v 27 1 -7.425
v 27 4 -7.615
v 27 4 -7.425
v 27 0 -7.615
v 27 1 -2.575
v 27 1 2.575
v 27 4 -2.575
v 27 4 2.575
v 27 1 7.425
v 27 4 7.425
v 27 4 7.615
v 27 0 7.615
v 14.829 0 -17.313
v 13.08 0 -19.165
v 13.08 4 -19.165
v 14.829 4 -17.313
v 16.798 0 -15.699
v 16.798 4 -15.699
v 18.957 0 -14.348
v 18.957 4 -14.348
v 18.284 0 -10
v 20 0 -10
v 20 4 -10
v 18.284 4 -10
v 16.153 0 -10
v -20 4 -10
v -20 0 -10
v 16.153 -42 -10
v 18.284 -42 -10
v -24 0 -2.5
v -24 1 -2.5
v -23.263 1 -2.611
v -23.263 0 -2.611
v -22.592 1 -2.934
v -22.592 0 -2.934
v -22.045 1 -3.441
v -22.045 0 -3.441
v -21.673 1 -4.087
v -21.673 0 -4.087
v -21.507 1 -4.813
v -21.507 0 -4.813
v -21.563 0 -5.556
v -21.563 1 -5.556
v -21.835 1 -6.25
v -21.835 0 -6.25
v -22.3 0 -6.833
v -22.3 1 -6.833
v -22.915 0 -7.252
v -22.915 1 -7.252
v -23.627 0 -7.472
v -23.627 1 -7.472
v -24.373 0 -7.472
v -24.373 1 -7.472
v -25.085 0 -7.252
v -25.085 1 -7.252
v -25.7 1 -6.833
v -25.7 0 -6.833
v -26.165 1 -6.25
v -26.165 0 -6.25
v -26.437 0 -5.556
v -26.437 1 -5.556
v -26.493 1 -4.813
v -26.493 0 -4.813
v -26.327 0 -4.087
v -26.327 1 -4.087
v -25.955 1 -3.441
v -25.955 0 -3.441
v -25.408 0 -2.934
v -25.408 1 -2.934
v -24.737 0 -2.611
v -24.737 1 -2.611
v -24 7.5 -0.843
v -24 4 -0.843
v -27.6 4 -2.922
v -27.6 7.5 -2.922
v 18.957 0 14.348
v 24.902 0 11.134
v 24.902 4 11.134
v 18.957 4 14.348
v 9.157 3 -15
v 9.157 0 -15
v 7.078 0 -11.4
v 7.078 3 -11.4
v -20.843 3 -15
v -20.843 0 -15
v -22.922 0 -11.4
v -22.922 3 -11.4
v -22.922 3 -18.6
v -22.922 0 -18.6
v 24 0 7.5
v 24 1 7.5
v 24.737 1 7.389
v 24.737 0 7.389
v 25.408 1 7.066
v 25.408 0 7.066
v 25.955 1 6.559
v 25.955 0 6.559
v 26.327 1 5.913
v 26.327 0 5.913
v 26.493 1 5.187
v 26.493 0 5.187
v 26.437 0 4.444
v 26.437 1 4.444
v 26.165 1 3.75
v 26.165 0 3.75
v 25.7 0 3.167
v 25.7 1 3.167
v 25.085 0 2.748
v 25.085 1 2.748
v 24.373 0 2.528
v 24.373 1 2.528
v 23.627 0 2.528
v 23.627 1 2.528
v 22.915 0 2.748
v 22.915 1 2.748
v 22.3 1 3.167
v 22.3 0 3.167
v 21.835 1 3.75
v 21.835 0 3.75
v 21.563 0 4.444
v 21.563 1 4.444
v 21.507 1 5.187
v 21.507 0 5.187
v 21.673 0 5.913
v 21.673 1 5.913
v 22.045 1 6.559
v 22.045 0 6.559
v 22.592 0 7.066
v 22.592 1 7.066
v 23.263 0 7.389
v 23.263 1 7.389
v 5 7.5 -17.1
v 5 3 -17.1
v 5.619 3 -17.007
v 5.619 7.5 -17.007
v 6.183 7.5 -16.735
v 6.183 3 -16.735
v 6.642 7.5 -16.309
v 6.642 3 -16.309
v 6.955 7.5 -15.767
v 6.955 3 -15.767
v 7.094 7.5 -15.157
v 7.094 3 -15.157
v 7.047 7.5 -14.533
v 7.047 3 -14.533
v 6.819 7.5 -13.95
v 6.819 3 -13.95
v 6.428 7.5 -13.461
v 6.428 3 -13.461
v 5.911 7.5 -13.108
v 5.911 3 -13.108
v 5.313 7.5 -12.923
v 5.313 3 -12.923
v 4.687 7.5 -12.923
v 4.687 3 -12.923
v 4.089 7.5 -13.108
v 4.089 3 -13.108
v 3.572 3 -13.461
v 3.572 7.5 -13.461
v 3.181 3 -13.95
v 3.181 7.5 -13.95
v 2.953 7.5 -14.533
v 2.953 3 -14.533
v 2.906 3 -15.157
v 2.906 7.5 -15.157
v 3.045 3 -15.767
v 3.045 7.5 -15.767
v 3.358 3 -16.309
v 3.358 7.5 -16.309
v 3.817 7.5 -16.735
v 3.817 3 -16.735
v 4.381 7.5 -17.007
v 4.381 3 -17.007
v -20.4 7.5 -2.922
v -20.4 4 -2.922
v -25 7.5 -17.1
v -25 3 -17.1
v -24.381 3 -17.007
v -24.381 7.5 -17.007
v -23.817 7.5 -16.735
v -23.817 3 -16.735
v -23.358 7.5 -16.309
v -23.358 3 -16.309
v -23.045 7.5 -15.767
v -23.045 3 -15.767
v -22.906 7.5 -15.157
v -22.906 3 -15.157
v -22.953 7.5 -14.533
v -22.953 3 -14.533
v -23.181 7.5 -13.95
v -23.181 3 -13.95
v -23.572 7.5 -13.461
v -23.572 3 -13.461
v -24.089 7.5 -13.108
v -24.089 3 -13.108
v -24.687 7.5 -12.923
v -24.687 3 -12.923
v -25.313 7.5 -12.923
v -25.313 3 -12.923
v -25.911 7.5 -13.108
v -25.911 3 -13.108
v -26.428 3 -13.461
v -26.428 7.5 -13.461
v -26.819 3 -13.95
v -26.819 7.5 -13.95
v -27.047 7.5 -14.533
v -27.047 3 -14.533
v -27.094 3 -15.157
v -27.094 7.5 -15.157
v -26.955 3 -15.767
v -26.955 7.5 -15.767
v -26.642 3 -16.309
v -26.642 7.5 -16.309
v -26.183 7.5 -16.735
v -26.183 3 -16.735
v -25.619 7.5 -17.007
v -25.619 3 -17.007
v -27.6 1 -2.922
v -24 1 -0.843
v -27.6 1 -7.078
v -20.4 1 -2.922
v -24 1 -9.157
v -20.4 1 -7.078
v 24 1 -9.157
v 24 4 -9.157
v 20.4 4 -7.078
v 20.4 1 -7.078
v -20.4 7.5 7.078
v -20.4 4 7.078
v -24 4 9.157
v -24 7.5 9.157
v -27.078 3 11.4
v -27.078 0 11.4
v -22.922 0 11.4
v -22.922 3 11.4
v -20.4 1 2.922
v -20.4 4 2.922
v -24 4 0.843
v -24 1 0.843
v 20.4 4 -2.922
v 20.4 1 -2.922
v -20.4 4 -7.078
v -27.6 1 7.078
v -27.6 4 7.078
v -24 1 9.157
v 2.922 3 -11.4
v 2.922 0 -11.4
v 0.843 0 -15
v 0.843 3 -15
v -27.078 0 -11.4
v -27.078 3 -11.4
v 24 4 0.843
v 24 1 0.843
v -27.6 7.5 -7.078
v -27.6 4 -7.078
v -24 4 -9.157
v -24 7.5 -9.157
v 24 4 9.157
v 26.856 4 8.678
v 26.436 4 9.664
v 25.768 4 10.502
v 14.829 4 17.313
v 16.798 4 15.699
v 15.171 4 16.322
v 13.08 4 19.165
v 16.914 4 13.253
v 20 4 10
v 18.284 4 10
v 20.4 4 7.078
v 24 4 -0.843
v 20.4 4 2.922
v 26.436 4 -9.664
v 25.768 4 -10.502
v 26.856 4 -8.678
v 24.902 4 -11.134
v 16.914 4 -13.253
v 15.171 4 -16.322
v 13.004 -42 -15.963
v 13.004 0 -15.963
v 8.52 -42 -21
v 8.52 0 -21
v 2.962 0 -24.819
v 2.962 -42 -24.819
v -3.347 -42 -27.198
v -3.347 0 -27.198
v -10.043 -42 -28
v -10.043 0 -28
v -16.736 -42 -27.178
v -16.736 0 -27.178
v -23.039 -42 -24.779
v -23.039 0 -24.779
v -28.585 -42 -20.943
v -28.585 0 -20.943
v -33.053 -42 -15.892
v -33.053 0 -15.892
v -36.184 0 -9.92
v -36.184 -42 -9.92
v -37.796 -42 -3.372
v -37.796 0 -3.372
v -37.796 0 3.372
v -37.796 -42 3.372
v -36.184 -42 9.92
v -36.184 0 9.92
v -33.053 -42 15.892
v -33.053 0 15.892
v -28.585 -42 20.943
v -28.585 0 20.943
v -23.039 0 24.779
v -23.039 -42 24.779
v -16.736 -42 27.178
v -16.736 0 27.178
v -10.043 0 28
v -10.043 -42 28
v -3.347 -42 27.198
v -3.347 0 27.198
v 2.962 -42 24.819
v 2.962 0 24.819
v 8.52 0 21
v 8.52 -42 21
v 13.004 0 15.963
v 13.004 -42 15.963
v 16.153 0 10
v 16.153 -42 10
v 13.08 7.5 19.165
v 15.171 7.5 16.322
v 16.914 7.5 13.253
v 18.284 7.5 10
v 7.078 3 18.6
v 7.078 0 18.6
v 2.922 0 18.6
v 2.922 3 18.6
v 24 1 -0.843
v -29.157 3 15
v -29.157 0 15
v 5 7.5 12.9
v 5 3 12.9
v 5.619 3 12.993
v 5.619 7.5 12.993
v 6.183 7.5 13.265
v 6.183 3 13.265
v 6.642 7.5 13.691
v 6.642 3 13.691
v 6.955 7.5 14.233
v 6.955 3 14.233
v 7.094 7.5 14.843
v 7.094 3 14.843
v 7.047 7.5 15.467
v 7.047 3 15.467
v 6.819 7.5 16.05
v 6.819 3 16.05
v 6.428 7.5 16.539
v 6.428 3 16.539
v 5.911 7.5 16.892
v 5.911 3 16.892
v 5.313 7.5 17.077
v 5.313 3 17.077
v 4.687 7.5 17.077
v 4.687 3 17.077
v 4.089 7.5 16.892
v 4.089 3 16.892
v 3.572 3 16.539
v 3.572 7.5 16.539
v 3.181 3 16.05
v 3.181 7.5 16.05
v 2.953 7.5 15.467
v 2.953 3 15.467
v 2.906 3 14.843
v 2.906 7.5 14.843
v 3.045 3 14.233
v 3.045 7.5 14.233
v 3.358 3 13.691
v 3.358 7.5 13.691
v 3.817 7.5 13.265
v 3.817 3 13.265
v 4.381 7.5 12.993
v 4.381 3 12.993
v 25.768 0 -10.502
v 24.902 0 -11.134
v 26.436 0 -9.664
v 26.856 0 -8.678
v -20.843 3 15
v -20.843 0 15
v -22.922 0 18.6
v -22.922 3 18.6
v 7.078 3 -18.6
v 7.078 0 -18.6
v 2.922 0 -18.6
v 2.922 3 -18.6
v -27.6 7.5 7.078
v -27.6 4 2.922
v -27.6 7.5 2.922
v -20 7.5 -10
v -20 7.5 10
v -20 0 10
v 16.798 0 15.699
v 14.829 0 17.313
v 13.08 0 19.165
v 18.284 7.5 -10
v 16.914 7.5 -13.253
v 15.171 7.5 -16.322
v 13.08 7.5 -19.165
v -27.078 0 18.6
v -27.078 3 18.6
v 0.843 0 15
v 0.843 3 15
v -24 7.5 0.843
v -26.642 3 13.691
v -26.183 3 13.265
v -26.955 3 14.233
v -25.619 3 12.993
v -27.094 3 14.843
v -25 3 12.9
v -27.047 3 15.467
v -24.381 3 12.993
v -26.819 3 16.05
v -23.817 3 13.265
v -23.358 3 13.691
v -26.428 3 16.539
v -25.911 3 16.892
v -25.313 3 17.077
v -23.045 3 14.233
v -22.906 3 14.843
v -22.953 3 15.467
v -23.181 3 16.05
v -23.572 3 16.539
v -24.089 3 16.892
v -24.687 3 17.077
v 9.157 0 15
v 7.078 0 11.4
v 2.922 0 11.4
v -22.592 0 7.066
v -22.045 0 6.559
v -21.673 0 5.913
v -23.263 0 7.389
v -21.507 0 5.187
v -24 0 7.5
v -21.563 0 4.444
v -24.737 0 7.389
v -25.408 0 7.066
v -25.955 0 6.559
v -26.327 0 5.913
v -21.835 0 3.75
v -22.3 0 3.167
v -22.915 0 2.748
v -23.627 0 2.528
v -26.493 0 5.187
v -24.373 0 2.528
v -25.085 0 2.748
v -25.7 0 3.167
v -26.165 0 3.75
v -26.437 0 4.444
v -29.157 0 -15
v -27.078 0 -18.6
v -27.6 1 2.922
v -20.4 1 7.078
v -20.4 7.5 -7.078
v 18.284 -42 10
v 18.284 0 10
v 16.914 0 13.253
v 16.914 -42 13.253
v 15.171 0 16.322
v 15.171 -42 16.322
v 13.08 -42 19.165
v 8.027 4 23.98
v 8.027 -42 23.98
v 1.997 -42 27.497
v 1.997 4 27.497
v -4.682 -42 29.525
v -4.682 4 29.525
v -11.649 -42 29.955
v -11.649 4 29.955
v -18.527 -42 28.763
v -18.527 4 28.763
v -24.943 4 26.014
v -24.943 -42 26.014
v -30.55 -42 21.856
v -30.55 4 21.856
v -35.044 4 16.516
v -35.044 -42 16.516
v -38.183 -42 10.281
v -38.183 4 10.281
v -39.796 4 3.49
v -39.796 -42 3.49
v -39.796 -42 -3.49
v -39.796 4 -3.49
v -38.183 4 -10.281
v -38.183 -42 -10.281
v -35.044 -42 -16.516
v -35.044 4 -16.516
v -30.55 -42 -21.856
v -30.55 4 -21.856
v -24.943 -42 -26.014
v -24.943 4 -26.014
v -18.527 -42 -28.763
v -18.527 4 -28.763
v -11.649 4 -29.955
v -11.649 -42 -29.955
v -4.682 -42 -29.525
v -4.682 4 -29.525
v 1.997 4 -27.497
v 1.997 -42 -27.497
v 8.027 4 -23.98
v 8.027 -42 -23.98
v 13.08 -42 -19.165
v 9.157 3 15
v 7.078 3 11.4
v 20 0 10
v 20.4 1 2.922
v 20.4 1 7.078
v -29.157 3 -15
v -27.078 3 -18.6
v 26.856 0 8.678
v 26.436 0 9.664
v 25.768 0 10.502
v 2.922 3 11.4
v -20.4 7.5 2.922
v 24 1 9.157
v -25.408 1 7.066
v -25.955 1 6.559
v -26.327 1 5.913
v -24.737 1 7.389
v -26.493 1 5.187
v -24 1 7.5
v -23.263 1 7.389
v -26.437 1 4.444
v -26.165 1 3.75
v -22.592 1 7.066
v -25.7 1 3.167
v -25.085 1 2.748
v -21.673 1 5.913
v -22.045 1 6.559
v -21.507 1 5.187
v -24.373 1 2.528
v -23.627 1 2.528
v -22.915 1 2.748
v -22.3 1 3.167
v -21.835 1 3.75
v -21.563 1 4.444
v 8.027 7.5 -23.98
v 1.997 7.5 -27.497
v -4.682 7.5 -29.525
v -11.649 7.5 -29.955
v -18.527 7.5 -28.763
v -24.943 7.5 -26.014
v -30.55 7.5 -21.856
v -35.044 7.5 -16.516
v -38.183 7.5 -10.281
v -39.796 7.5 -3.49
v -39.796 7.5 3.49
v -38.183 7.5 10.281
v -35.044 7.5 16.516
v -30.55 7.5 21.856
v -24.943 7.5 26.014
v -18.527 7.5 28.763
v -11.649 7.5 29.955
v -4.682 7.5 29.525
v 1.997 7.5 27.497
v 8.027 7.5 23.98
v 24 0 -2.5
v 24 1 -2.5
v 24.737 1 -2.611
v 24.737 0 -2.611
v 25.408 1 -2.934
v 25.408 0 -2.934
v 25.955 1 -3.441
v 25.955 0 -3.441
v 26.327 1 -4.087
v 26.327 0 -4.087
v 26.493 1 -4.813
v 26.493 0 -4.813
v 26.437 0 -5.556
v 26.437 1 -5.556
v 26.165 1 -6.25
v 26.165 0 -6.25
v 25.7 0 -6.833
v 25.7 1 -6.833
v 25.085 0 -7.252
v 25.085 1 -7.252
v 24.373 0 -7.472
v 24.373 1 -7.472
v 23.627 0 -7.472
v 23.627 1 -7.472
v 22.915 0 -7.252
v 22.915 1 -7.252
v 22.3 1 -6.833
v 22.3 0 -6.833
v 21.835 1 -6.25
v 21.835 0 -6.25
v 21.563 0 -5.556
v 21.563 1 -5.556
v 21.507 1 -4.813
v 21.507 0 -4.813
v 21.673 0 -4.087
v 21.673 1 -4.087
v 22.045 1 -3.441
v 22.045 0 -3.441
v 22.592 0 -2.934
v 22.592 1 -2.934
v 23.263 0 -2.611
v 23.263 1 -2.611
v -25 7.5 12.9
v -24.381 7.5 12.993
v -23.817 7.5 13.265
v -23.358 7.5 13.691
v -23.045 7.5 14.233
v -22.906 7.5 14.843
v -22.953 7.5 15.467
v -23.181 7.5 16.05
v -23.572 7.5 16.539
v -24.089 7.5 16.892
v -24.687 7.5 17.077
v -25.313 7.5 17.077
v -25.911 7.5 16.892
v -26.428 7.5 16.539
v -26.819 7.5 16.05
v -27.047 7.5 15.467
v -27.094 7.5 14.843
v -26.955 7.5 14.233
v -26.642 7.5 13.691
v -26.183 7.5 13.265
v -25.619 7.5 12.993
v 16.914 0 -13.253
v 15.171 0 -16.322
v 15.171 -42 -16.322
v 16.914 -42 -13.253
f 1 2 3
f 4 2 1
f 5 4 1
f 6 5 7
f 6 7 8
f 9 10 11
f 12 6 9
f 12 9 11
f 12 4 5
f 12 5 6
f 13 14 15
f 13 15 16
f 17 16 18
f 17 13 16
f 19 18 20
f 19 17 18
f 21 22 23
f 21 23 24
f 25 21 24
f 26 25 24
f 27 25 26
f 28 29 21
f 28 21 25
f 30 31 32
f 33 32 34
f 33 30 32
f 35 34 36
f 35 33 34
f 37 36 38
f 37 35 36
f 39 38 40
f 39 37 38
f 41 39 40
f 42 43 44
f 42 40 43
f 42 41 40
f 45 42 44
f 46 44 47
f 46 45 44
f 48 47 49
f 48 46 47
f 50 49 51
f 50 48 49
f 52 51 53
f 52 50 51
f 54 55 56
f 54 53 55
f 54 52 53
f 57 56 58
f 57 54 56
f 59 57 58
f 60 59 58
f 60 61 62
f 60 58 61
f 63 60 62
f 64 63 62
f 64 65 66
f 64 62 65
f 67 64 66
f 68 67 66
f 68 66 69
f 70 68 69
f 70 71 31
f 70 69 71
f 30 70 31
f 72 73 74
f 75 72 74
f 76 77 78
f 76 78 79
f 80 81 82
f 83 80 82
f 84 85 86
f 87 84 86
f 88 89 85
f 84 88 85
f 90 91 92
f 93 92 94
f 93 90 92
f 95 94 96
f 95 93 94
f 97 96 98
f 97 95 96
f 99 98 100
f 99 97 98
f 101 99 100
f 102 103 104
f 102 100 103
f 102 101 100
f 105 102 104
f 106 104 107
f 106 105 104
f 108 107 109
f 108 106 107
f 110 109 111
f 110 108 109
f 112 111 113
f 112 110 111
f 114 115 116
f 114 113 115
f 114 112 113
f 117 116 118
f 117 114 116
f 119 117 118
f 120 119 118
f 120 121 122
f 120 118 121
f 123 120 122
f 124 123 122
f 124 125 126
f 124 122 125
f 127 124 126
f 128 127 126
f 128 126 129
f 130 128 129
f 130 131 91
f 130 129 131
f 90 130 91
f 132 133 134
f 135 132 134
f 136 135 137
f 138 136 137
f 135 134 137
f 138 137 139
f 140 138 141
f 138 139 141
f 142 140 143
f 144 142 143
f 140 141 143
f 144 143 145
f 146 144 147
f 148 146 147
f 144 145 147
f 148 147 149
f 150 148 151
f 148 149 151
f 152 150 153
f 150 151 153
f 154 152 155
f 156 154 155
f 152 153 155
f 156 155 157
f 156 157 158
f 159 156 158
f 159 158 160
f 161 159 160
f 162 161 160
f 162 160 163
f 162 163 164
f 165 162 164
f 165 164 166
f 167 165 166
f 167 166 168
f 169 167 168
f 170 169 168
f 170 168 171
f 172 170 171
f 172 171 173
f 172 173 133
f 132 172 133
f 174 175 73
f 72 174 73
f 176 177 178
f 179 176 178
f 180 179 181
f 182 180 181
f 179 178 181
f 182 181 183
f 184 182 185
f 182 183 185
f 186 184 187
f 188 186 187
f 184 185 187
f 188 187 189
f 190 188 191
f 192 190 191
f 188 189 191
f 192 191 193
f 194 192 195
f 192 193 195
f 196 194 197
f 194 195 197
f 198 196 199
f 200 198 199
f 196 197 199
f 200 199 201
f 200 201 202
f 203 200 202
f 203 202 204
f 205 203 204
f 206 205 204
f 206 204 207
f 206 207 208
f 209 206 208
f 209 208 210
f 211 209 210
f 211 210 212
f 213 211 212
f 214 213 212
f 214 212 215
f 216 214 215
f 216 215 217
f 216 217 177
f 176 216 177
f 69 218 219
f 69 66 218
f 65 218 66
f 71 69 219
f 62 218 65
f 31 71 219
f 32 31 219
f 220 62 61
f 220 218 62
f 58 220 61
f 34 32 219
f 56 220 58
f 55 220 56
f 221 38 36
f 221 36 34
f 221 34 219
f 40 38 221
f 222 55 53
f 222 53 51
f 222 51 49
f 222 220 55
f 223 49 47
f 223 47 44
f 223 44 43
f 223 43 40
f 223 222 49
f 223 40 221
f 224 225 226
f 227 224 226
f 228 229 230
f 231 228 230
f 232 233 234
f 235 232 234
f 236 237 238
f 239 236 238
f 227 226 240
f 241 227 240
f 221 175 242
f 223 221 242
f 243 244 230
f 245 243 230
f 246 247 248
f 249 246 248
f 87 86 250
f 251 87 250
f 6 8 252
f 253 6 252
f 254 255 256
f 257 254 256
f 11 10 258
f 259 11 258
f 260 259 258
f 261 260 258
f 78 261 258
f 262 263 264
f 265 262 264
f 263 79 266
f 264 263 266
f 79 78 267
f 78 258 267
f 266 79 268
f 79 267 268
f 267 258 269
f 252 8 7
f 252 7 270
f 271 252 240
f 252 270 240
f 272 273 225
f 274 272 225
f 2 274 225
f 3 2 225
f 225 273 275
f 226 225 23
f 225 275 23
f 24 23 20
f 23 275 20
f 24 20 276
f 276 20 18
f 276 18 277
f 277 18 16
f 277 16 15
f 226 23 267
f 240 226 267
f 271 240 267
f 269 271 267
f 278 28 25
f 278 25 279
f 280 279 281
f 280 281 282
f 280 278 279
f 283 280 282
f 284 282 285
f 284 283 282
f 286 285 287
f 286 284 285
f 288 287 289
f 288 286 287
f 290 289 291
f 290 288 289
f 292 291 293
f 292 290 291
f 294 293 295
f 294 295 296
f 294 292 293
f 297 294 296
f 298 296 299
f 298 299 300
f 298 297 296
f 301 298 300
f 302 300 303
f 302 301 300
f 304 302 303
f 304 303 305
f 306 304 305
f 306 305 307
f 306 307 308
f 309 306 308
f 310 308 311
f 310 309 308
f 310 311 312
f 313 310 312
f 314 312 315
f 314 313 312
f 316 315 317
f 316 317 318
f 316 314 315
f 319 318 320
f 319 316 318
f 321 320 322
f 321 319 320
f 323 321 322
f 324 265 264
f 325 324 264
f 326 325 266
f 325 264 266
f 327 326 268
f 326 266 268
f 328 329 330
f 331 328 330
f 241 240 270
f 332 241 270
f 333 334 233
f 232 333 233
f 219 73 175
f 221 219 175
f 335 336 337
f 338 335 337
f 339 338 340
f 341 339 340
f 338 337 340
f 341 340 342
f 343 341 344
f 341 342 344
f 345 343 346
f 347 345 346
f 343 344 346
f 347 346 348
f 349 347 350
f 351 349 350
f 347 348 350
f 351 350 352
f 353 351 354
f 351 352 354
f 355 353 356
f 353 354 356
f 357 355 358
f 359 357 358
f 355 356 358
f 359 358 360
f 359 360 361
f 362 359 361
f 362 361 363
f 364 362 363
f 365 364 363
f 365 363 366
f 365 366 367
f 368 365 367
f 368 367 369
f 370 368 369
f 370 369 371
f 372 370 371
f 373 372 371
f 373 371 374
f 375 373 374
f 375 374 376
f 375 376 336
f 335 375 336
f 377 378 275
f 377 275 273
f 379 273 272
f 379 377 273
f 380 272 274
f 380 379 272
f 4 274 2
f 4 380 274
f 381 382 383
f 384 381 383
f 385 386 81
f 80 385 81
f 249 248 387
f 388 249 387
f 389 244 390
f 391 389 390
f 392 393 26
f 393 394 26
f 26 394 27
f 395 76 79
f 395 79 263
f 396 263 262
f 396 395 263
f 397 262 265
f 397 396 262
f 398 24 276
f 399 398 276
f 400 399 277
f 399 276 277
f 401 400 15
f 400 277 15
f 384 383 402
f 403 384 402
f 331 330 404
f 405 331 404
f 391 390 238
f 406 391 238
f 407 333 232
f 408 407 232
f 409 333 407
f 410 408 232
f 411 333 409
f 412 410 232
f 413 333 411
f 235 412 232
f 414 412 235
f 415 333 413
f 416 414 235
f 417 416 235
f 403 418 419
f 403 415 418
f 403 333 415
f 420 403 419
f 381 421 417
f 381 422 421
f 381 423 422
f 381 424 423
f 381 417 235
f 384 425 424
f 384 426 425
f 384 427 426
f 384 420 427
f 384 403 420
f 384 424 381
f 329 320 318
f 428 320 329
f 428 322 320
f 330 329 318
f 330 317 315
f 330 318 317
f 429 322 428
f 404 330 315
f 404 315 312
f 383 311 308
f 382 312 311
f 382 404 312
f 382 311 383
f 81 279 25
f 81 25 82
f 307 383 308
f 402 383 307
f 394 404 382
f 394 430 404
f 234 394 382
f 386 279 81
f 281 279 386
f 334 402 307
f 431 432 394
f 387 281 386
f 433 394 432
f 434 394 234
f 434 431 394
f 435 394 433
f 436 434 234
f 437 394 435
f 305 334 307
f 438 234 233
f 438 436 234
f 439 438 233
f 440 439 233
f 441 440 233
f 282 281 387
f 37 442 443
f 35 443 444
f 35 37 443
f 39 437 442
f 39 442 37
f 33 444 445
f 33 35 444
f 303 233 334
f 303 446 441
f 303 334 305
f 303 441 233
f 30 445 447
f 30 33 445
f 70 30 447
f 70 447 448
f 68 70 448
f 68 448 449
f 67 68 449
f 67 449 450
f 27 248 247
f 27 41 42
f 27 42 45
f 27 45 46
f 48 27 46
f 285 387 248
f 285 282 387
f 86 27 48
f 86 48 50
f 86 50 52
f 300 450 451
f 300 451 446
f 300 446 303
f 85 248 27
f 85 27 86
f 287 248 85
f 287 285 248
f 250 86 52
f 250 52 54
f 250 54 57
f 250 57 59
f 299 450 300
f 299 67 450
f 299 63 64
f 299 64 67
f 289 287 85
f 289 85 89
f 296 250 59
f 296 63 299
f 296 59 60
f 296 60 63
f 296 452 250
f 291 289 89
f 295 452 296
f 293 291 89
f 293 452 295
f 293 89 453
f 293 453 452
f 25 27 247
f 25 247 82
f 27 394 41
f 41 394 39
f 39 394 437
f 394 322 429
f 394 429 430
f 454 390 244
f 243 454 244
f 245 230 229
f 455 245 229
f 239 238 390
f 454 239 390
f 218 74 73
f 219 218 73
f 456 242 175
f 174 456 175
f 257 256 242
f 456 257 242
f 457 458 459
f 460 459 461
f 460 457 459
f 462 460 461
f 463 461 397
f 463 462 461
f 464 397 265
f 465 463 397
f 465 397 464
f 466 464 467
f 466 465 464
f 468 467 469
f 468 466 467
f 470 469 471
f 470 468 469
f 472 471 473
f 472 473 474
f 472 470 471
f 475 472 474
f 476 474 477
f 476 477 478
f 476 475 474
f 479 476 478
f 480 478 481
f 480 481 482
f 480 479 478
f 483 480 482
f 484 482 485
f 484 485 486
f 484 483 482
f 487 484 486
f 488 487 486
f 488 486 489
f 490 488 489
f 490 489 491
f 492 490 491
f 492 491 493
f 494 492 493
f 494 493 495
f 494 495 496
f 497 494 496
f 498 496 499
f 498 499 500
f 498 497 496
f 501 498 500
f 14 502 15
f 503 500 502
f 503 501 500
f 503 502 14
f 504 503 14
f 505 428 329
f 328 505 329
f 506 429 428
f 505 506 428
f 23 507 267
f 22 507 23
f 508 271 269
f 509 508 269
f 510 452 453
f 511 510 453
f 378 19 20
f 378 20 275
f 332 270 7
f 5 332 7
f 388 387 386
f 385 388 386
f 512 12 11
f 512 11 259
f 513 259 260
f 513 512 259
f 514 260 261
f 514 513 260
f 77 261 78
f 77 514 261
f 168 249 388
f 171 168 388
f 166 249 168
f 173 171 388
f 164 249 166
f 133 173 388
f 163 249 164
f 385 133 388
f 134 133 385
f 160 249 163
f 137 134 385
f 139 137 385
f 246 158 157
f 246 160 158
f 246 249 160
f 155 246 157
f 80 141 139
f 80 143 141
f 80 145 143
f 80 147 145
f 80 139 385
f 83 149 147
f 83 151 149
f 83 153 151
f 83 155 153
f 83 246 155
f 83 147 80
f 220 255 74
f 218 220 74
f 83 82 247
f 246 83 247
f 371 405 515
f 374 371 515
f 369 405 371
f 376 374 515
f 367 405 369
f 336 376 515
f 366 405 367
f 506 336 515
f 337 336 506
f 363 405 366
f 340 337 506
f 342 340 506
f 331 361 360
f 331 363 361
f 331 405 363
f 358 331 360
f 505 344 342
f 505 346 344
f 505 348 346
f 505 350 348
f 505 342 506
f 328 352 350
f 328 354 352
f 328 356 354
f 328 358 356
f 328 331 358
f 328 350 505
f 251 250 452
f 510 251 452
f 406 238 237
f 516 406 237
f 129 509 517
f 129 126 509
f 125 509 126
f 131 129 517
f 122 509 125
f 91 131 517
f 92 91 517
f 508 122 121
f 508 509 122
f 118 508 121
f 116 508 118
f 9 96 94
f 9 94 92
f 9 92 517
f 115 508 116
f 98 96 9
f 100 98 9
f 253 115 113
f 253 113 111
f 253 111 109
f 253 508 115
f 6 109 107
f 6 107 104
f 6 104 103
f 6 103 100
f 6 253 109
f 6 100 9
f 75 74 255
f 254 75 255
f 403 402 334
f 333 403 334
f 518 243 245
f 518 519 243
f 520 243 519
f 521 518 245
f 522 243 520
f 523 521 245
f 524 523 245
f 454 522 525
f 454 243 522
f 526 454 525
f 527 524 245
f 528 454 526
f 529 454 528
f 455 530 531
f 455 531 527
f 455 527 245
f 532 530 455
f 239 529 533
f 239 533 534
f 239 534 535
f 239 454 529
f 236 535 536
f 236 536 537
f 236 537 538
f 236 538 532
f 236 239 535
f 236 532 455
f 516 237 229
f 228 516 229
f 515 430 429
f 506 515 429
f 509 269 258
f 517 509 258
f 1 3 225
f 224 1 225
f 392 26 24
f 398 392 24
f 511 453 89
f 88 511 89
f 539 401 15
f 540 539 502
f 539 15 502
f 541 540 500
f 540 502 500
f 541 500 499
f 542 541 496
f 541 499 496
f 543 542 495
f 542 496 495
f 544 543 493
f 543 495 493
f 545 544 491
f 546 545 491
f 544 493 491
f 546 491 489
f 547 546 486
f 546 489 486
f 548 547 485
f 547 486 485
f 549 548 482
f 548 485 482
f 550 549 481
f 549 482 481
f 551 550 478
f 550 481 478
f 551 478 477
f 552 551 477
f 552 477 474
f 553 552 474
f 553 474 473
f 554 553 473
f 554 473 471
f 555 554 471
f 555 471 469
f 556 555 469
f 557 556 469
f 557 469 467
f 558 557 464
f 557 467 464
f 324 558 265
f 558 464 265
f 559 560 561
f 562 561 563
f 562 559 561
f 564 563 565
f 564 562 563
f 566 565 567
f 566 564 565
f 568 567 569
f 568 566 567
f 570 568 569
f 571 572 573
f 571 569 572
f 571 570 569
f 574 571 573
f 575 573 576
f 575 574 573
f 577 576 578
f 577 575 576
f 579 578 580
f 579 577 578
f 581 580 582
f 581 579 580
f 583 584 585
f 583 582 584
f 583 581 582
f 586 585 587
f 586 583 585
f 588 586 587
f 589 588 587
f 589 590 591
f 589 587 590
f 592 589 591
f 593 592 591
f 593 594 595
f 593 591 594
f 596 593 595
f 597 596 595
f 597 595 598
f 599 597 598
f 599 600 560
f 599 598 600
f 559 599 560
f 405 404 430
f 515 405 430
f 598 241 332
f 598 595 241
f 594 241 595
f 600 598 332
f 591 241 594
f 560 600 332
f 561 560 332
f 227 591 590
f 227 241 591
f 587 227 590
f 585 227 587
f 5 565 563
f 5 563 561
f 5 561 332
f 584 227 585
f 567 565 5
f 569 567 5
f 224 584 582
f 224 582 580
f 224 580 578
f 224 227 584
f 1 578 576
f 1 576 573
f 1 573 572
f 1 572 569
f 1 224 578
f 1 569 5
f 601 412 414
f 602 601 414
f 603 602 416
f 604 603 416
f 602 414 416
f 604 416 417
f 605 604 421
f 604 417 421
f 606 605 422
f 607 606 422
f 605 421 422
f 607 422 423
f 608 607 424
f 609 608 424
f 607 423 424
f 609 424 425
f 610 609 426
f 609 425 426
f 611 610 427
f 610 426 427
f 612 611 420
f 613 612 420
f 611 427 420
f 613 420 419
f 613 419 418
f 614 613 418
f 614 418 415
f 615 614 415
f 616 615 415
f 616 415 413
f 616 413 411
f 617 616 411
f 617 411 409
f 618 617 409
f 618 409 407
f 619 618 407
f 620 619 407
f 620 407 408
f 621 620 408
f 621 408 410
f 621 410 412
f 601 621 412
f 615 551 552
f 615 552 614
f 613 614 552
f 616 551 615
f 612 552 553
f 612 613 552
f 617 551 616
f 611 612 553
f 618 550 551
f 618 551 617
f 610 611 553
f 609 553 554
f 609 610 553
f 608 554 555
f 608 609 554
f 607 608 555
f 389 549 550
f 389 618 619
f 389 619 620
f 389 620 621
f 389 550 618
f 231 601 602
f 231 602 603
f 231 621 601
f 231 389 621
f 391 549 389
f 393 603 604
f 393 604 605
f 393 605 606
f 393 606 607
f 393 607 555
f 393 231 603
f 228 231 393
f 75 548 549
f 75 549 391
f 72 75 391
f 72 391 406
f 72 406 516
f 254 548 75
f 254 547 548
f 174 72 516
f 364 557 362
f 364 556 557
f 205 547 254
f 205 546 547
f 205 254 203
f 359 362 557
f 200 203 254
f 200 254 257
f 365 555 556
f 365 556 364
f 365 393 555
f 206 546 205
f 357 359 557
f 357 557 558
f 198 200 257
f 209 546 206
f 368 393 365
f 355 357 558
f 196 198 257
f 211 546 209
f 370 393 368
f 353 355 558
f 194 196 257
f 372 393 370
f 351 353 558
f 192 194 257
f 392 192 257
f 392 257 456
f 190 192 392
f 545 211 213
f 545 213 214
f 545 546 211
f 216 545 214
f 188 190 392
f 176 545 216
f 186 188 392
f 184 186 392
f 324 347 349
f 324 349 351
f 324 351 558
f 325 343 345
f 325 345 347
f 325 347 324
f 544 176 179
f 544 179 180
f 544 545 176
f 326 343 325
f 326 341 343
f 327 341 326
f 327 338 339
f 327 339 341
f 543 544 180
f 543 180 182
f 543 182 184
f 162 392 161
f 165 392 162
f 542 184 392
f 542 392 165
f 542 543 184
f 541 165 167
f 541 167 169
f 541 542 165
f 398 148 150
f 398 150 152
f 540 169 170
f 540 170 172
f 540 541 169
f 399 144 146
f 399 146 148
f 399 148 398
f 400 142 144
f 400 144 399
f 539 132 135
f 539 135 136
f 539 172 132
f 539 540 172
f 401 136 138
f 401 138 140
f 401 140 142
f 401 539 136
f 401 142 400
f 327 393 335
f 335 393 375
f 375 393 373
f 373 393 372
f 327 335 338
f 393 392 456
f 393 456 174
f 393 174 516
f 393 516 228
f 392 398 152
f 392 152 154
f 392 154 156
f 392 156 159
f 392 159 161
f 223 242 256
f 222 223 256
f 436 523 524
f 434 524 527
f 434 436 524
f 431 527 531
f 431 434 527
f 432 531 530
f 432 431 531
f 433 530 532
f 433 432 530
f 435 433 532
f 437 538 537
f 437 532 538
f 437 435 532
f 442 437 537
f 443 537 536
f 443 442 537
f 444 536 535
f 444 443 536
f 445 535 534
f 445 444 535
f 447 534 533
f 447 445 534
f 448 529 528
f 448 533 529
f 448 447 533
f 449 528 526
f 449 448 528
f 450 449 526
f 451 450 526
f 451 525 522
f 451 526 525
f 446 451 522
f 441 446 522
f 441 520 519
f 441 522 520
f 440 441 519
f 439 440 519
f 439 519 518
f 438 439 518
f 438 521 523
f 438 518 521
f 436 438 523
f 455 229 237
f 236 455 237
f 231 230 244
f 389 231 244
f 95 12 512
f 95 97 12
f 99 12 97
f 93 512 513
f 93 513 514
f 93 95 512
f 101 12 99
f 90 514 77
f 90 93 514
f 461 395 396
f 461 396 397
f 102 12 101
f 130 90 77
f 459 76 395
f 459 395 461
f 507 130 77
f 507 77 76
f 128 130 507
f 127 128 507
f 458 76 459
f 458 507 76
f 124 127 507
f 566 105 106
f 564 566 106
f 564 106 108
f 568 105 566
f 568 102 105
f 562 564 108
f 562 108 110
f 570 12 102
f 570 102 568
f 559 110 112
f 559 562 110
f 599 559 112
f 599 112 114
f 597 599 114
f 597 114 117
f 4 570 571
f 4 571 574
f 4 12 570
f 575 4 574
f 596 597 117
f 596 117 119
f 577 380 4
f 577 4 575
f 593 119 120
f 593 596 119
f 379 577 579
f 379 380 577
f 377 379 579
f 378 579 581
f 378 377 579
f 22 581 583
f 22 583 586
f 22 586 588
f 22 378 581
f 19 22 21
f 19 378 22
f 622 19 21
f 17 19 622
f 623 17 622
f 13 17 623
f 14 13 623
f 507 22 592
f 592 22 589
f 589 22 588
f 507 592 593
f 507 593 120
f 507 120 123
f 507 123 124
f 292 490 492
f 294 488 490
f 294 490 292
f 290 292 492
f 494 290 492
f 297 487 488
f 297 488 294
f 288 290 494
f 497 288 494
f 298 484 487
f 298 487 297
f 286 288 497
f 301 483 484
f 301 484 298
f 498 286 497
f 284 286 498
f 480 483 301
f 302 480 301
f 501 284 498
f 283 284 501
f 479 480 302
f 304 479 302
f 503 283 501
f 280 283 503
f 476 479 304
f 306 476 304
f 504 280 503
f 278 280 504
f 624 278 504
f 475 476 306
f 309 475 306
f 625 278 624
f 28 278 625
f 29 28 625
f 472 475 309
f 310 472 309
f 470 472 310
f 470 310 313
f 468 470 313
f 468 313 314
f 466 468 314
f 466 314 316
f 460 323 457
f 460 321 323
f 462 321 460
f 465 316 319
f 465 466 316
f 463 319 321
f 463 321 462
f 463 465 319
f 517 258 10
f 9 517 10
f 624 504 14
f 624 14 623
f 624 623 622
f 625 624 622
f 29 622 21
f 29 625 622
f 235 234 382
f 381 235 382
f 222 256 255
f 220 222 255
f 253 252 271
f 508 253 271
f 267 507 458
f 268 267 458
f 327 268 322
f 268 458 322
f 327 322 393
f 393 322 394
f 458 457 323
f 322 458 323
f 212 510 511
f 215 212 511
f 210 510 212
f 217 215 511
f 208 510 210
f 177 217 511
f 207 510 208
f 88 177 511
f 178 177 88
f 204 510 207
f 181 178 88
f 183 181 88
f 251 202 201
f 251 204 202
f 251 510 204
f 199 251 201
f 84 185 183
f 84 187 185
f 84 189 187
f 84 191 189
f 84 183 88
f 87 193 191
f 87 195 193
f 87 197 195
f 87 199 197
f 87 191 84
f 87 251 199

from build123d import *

# Parameters (mm, degrees)
SKETCH_1_R          = 2.5
SKETCH_1_W          = 40
SKETCH_1_H          = 20
EXTRUDE_3_DEPTH     = 4
EXTRUDE_START       = 42
EXTRUDE_16_DEPTH    = 42
CUT_EXTRUDE_1_DEPTH = 3
EXTRUDE_4_DEPTH     = 3.5
CUT_EXTRUDE_2_DEPTH = 3
SKETCH_6_R          = 2.1
CUT_EXTRUDE_3_DEPTH = 66.299310869


with BuildPart() as part:
    # 草图1 → 凸台-拉伸3 (new body)
    with BuildSketch(Plane(origin=(0, 0, 0), x_dir=(1, 0, 0), z_dir=(0, 1, 0))):
        with BuildLine():
            Line((18.956802834, 14.347674144), (24.902068137, 11.134017223))
            ThreePointArc((24.902068137, 11.134017223), (26.435714813, 9.663571926), (27, 7.615191169))
            Line((27, 7.615191169), (27, -7.615191169))
            ThreePointArc((27, -7.615191169), (26.435714813, -9.663571926), (24.902068137, -11.134017223))
            Line((24.902068137, -11.134017223), (18.956802834, -14.347674144))
            ThreePointArc((18.956802834, -14.347674144), (15.787653215, -16.474725649), (13.080286113, -19.165082649))
            ThreePointArc((13.080286113, -19.165082649), (-40, 0), (13.080286113, 19.165082649))
            ThreePointArc((13.080286113, 19.165082649), (15.787653215, 16.474725649), (18.956802834, 14.347674144))
        make_face()
        with Locations(Location((24, 5, 0), (0, 0, 270))):
            Circle(SKETCH_1_R, mode=Mode.SUBTRACT)
        with Locations(Location((24, -5, 0), (0, 0, 270))):
            Circle(SKETCH_1_R, mode=Mode.SUBTRACT)
        with Locations(Location((-24, 5, 0), (0, 0, 270))):
            Circle(SKETCH_1_R, mode=Mode.SUBTRACT)
        with Locations(Location((-24, -5, 0), (0, 0, 270))):
            Circle(SKETCH_1_R, mode=Mode.SUBTRACT)
        Rectangle(SKETCH_1_W, SKETCH_1_H, mode=Mode.SUBTRACT)
    extrude(amount=EXTRUDE_3_DEPTH)

    # 草图10 → 凸台-拉伸16 (add)
    with BuildSketch(Plane.XZ.offset(EXTRUDE_START)):
        with BuildLine():
            Line((16.153393661, 10), (18.284271247, 10))
            ThreePointArc((18.284271247, 10), (16.087911438, 14.812861871), (13.080286113, 19.165082649))
            ThreePointArc((13.080286113, 19.165082649), (-40, 0), (13.080286113, -19.165082649))
            ThreePointArc((13.080286113, -19.165082649), (16.087911438, -14.812861871), (18.284271247, -10))
            Line((18.284271247, -10), (16.153393661, -10))
            ThreePointArc((16.153393661, -10), (-38, 0), (16.153393661, 10))
        make_face()
    extrude(amount=-EXTRUDE_16_DEPTH)

    # 草图2 → 切除-拉伸1 (cut)
    with BuildSketch(Plane(origin=(0, 4, 0), x_dir=(1, 0, 0), z_dir=(0, 1, 0))):
        Polygon((24, 0.843078062), (27.6, 2.921539031), (27.6, 7.078460969), (24, 9.156921938), (20.4, 7.078460969), (20.4, 2.921539031), align=None)
        Polygon((-24, 0.843078062), (-20.4, 2.921539031), (-20.4, 7.078460969), (-24, 9.156921938), (-27.6, 7.078460969), (-27.6, 2.921539031), align=None)
        Polygon((24, -9.156921938), (27.6, -7.078460969), (27.6, -2.921539031), (24, -0.843078062), (20.4, -2.921539031), (20.4, -7.078460969), align=None)
        Polygon((-24, -9.156921938), (-20.4, -7.078460969), (-20.4, -2.921539031), (-24, -0.843078062), (-27.6, -2.921539031), (-27.6, -7.078460969), align=None)
    extrude(amount=-CUT_EXTRUDE_1_DEPTH, mode=Mode.SUBTRACT)

    # 草图3 → 凸台-拉伸4 (add)
    with BuildSketch(Plane(origin=(0, 4, 0), x_dir=(1, 0, 0), z_dir=(0, 1, 0))):
        with BuildLine():
            Line((18.284271247, -10), (-20, -10))
            Line((-20, -10), (-20, 10))
            Line((-20, 10), (18.284271247, 10))
            ThreePointArc((18.284271247, 10), (16.087911438, 14.812861871), (13.080286113, 19.165082649))
            ThreePointArc((13.080286113, 19.165082649), (-40, 0), (13.080286113, -19.165082649))
            ThreePointArc((13.080286113, -19.165082649), (16.087911438, -14.812861871), (18.284271247, -10))
        make_face()
        Polygon((-20.4, -7.078460969), (-24, -9.156921938), (-27.6, -7.078460969), (-27.6, -2.921539031), (-24, -0.843078062), (-20.4, -2.921539031), align=None, mode=Mode.SUBTRACT)
        Polygon((-20.4, 2.921539031), (-24, 0.843078062), (-27.6, 2.921539031), (-27.6, 7.078460969), (-24, 9.156921938), (-20.4, 7.078460969), align=None, mode=Mode.SUBTRACT)
    extrude(amount=EXTRUDE_4_DEPTH)

    # 草图4 → 切除-拉伸2 (cut)
    with BuildSketch(Plane.XZ):
        Polygon((9.156921938, 15), (7.078460969, 18.6), (2.921539031, 18.6), (0.843078062, 15), (2.921539031, 11.4), (7.078460969, 11.4), align=None)
        Polygon((-20.843078062, 15), (-22.921539031, 18.6), (-27.078460969, 18.6), (-29.156921938, 15), (-27.078460969, 11.4), (-22.921539031, 11.4), align=None)
        Polygon((9.156921938, -15), (7.078460969, -11.4), (2.921539031, -11.4), (0.843078062, -15), (2.921539031, -18.6), (7.078460969, -18.6), align=None)
        Polygon((-20.843078062, -15), (-22.921539031, -11.4), (-27.078460969, -11.4), (-29.156921938, -15), (-27.078460969, -18.6), (-22.921539031, -18.6), align=None)
    extrude(amount=-CUT_EXTRUDE_2_DEPTH, mode=Mode.SUBTRACT)

    # 草图6 → 切除-拉伸3 (cut, through all)
    with BuildSketch(Plane.XZ):
        with Locations(Location((-25, 15, 0), (0, 0, 270))):
            Circle(SKETCH_6_R)
        with Locations(Location((5, 15, 0), (0, 0, 270))):
            Circle(SKETCH_6_R)
        with Locations(Location((5, -15, 0), (0, 0, 270))):
            Circle(SKETCH_6_R)
        with Locations(Location((-25, -15, 0), (0, 0, 270))):
            Circle(SKETCH_6_R)
    extrude(amount=-CUT_EXTRUDE_3_DEPTH, mode=Mode.SUBTRACT)


solid = part.part
